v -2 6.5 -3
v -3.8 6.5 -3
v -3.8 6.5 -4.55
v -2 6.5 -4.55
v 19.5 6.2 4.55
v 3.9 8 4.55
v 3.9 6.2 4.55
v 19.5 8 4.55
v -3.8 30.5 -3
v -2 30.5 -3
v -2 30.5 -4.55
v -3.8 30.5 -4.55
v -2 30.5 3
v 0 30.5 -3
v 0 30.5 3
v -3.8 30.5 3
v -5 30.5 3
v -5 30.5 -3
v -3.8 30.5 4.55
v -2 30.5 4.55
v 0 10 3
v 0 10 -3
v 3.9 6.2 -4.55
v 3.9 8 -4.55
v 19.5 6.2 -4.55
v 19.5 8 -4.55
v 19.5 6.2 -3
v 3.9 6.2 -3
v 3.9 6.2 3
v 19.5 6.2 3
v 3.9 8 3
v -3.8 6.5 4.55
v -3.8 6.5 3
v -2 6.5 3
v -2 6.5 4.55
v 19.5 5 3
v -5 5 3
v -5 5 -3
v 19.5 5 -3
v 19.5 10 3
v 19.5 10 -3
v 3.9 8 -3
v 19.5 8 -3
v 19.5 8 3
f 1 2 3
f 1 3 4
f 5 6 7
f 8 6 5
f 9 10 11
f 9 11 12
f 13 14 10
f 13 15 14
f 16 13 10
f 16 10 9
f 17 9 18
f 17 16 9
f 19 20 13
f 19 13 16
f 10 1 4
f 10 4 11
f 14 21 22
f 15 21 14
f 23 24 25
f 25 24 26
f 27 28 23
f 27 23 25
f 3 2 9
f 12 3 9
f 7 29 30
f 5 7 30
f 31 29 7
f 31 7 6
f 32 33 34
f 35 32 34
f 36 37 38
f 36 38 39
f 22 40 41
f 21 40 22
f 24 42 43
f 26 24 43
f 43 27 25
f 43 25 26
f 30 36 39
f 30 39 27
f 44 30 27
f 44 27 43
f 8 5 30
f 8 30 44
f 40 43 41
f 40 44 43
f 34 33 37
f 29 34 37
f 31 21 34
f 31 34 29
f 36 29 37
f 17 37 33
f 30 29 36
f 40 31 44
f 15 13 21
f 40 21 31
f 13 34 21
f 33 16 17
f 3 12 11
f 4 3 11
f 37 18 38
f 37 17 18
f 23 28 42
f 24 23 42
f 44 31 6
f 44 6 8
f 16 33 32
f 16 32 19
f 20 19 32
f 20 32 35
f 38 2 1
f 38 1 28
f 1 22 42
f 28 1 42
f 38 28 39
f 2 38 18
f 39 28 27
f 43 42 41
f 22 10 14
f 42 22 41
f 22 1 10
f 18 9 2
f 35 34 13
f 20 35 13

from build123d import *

# Parameters (mm, degrees)
PAD003_DEPTH  = 3
SKETCH006_W   = 1.8
SKETCH006_H   = 24
SKETCH006_W_2 = 15.6
SKETCH006_H_2 = 1.8
PAD004_DEPTH  = 1.55


with BuildPart() as part:
    # Sketch005 → Pad003 (new body, symmetric)
    with BuildSketch(Plane.XY):
        Polygon((-5, 30.5), (-5, 5), (19.5, 5), (19.5, 10), (0, 10), (0, 30.5), align=None)
    extrude(amount=PAD003_DEPTH, both=True)

    # Sketch006 (on Face8 of Pad003) → Pad004 (join)
    with BuildSketch(Plane.XY.offset(3)):
        with Locations((-2.9, 18.5)):
            Rectangle(SKETCH006_W, SKETCH006_H)
        with Locations((11.7, 7.1)):
            Rectangle(SKETCH006_W_2, SKETCH006_H_2)
    pad004 = extrude(amount=PAD004_DEPTH)

    # Mirrored001: Pad004 across XY
    add(pad004.mirror(Plane.XY))


solid = part.part
